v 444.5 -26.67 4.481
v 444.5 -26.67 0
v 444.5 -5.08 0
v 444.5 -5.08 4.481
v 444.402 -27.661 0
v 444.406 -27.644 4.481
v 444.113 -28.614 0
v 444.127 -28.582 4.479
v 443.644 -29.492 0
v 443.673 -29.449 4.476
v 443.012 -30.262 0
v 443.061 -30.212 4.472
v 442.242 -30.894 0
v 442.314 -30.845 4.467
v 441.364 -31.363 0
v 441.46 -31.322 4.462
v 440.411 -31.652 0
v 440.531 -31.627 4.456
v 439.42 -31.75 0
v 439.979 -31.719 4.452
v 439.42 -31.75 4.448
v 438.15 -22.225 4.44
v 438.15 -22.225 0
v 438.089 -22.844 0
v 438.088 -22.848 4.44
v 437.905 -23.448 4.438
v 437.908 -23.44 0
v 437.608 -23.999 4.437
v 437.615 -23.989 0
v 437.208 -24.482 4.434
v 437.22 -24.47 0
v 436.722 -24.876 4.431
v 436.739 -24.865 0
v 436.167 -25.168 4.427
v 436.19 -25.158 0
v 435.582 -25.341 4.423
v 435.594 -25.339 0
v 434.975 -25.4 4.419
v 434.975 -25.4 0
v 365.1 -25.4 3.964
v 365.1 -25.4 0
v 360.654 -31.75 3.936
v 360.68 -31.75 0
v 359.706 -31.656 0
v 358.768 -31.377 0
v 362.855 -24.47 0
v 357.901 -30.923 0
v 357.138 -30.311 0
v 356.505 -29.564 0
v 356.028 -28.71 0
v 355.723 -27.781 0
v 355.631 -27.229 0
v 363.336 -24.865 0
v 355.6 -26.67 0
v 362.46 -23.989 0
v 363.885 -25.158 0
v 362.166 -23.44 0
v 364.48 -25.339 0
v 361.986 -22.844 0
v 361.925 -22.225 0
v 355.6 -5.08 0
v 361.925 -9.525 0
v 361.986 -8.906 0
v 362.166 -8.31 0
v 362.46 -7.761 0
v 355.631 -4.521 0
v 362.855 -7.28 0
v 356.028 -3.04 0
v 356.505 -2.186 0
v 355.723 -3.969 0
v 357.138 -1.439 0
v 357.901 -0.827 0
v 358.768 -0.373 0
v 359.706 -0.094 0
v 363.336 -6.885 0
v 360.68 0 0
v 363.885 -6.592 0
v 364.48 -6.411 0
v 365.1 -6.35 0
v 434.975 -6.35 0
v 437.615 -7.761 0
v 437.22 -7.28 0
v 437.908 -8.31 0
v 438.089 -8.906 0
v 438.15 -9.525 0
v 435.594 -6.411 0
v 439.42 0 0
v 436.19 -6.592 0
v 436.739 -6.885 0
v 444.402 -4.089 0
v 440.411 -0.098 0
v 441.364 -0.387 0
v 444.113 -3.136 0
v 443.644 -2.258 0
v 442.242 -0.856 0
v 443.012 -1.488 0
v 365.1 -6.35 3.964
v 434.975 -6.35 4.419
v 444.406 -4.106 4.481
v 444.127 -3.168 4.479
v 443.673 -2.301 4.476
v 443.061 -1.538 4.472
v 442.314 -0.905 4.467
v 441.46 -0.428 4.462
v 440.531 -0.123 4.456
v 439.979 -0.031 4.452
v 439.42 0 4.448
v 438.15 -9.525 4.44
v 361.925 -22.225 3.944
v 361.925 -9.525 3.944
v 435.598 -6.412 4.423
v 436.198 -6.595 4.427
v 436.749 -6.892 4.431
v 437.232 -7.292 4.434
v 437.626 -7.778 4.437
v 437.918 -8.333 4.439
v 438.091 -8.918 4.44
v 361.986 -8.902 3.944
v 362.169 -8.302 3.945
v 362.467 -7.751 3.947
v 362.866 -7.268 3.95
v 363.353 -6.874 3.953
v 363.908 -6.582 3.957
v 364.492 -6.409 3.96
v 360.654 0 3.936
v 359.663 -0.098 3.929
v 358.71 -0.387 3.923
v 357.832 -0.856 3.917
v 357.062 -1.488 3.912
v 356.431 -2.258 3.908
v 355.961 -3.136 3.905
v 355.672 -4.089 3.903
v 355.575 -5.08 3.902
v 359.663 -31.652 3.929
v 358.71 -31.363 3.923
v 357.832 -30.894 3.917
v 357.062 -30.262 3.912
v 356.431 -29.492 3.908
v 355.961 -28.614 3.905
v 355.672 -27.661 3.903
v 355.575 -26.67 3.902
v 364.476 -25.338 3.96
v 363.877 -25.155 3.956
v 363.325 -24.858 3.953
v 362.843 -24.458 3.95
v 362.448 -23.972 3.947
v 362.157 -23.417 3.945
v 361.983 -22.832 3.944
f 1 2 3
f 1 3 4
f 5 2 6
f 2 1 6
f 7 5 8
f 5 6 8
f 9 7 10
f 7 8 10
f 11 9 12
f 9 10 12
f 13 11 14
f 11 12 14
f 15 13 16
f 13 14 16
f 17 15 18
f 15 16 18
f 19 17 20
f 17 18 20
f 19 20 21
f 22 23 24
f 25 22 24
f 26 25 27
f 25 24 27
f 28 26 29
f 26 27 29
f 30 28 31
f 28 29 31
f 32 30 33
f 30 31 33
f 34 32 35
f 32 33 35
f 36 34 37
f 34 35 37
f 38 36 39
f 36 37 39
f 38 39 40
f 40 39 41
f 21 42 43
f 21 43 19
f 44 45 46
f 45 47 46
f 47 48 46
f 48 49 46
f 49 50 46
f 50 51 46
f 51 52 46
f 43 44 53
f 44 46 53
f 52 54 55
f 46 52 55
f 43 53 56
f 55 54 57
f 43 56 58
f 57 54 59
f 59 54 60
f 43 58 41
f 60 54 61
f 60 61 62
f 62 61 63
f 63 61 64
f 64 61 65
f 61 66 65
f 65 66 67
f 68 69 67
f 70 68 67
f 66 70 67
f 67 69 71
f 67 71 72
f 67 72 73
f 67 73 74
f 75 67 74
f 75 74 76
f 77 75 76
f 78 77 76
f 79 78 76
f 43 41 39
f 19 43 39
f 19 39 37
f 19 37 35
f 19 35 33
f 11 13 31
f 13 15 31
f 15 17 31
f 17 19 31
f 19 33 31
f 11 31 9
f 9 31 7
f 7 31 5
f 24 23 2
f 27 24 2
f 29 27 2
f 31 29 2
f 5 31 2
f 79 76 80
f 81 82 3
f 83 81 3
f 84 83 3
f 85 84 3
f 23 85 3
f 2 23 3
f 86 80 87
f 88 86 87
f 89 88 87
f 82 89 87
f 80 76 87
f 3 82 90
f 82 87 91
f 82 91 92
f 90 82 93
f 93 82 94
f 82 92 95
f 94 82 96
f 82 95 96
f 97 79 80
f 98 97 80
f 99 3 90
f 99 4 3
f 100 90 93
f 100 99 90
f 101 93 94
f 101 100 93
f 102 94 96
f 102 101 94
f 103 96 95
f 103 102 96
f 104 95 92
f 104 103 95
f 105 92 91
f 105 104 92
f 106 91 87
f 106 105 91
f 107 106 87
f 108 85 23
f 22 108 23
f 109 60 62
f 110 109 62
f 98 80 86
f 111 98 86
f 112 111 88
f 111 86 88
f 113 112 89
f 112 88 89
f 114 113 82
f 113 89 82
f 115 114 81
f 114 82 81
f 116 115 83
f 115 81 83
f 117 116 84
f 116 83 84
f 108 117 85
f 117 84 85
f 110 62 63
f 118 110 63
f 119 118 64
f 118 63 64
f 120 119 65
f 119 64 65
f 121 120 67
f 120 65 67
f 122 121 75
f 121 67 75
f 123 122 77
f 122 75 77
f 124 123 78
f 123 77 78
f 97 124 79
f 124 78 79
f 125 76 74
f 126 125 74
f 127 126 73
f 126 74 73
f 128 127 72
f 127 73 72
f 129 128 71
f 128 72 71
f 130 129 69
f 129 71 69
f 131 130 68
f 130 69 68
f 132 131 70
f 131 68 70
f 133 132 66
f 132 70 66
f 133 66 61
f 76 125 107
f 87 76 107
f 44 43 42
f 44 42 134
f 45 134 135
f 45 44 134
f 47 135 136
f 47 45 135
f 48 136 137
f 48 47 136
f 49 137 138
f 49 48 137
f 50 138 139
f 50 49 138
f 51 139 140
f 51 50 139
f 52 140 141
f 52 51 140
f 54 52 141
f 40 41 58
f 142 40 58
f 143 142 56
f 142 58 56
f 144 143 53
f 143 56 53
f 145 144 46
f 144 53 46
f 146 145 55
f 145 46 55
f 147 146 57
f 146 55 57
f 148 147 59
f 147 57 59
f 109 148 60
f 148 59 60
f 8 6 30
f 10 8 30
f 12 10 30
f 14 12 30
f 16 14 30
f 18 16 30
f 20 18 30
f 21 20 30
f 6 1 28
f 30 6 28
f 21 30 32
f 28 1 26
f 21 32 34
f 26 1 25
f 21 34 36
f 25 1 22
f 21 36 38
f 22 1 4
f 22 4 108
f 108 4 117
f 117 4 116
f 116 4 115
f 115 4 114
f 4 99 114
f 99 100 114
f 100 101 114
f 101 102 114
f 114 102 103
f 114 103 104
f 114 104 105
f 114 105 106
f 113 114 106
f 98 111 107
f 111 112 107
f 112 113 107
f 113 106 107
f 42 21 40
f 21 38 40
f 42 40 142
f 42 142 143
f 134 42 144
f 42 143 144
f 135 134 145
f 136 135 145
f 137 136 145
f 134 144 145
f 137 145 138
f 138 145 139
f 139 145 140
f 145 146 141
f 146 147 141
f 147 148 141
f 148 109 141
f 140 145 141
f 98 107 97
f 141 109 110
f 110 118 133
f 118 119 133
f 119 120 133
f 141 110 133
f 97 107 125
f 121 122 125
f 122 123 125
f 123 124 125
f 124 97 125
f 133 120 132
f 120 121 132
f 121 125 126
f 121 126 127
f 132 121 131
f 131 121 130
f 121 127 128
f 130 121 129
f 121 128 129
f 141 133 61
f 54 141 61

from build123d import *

# Parameters (mm, degrees)
F3_DEPTH = 31.75
F5_DEPTH = 4.48238
F6_R     = 5.08


with BuildPart() as f3:
    # F2 (on Front) → F3 (new body)
    with BuildSketch(Plane.XZ):
        Polygon((444.5, 0), (444.5, 4.48138), (355.574593, 3.902439), (355.6, 0), align=None)
    extrude(amount=F3_DEPTH)

    # F4 (on face) → F5 (cut, through all)
    with BuildSketch(Plane(origin=(0, 0, 0), x_dir=(1, 0, 0), z_dir=(0, 0, -1))):
        with BuildLine():
            Line((434.975, 25.4), (365.099593, 25.4))
            ThreePointArc((365.099593, 25.4), (362.854529, 24.470064), (361.924593, 22.225))
            Line((361.924593, 22.225), (361.924593, 9.525))
            ThreePointArc((361.924593, 9.525), (362.854529, 7.279936), (365.099593, 6.35))
            Line((365.099593, 6.35), (434.975, 6.35))
            ThreePointArc((434.975, 6.35), (437.220064, 7.279936), (438.15, 9.525))
            Line((438.15, 9.525), (438.15, 22.225))
            ThreePointArc((438.15, 22.225), (437.220064, 24.470064), (434.975, 25.4))
        make_face()
    extrude(amount=-F5_DEPTH, mode=Mode.SUBTRACT)

    # F6
    f6_edges = [f3.edges().sort_by_distance(p)[0] for p in [
        (444.5, -31.75, 2.24069),
        (355.587297, -31.75, 1.951219),
        (355.587297, 0, 1.951219),
        (444.5, 0, 2.24069),
    ]]
    fillet(f6_edges, radius=F6_R)


solid = f3.part
